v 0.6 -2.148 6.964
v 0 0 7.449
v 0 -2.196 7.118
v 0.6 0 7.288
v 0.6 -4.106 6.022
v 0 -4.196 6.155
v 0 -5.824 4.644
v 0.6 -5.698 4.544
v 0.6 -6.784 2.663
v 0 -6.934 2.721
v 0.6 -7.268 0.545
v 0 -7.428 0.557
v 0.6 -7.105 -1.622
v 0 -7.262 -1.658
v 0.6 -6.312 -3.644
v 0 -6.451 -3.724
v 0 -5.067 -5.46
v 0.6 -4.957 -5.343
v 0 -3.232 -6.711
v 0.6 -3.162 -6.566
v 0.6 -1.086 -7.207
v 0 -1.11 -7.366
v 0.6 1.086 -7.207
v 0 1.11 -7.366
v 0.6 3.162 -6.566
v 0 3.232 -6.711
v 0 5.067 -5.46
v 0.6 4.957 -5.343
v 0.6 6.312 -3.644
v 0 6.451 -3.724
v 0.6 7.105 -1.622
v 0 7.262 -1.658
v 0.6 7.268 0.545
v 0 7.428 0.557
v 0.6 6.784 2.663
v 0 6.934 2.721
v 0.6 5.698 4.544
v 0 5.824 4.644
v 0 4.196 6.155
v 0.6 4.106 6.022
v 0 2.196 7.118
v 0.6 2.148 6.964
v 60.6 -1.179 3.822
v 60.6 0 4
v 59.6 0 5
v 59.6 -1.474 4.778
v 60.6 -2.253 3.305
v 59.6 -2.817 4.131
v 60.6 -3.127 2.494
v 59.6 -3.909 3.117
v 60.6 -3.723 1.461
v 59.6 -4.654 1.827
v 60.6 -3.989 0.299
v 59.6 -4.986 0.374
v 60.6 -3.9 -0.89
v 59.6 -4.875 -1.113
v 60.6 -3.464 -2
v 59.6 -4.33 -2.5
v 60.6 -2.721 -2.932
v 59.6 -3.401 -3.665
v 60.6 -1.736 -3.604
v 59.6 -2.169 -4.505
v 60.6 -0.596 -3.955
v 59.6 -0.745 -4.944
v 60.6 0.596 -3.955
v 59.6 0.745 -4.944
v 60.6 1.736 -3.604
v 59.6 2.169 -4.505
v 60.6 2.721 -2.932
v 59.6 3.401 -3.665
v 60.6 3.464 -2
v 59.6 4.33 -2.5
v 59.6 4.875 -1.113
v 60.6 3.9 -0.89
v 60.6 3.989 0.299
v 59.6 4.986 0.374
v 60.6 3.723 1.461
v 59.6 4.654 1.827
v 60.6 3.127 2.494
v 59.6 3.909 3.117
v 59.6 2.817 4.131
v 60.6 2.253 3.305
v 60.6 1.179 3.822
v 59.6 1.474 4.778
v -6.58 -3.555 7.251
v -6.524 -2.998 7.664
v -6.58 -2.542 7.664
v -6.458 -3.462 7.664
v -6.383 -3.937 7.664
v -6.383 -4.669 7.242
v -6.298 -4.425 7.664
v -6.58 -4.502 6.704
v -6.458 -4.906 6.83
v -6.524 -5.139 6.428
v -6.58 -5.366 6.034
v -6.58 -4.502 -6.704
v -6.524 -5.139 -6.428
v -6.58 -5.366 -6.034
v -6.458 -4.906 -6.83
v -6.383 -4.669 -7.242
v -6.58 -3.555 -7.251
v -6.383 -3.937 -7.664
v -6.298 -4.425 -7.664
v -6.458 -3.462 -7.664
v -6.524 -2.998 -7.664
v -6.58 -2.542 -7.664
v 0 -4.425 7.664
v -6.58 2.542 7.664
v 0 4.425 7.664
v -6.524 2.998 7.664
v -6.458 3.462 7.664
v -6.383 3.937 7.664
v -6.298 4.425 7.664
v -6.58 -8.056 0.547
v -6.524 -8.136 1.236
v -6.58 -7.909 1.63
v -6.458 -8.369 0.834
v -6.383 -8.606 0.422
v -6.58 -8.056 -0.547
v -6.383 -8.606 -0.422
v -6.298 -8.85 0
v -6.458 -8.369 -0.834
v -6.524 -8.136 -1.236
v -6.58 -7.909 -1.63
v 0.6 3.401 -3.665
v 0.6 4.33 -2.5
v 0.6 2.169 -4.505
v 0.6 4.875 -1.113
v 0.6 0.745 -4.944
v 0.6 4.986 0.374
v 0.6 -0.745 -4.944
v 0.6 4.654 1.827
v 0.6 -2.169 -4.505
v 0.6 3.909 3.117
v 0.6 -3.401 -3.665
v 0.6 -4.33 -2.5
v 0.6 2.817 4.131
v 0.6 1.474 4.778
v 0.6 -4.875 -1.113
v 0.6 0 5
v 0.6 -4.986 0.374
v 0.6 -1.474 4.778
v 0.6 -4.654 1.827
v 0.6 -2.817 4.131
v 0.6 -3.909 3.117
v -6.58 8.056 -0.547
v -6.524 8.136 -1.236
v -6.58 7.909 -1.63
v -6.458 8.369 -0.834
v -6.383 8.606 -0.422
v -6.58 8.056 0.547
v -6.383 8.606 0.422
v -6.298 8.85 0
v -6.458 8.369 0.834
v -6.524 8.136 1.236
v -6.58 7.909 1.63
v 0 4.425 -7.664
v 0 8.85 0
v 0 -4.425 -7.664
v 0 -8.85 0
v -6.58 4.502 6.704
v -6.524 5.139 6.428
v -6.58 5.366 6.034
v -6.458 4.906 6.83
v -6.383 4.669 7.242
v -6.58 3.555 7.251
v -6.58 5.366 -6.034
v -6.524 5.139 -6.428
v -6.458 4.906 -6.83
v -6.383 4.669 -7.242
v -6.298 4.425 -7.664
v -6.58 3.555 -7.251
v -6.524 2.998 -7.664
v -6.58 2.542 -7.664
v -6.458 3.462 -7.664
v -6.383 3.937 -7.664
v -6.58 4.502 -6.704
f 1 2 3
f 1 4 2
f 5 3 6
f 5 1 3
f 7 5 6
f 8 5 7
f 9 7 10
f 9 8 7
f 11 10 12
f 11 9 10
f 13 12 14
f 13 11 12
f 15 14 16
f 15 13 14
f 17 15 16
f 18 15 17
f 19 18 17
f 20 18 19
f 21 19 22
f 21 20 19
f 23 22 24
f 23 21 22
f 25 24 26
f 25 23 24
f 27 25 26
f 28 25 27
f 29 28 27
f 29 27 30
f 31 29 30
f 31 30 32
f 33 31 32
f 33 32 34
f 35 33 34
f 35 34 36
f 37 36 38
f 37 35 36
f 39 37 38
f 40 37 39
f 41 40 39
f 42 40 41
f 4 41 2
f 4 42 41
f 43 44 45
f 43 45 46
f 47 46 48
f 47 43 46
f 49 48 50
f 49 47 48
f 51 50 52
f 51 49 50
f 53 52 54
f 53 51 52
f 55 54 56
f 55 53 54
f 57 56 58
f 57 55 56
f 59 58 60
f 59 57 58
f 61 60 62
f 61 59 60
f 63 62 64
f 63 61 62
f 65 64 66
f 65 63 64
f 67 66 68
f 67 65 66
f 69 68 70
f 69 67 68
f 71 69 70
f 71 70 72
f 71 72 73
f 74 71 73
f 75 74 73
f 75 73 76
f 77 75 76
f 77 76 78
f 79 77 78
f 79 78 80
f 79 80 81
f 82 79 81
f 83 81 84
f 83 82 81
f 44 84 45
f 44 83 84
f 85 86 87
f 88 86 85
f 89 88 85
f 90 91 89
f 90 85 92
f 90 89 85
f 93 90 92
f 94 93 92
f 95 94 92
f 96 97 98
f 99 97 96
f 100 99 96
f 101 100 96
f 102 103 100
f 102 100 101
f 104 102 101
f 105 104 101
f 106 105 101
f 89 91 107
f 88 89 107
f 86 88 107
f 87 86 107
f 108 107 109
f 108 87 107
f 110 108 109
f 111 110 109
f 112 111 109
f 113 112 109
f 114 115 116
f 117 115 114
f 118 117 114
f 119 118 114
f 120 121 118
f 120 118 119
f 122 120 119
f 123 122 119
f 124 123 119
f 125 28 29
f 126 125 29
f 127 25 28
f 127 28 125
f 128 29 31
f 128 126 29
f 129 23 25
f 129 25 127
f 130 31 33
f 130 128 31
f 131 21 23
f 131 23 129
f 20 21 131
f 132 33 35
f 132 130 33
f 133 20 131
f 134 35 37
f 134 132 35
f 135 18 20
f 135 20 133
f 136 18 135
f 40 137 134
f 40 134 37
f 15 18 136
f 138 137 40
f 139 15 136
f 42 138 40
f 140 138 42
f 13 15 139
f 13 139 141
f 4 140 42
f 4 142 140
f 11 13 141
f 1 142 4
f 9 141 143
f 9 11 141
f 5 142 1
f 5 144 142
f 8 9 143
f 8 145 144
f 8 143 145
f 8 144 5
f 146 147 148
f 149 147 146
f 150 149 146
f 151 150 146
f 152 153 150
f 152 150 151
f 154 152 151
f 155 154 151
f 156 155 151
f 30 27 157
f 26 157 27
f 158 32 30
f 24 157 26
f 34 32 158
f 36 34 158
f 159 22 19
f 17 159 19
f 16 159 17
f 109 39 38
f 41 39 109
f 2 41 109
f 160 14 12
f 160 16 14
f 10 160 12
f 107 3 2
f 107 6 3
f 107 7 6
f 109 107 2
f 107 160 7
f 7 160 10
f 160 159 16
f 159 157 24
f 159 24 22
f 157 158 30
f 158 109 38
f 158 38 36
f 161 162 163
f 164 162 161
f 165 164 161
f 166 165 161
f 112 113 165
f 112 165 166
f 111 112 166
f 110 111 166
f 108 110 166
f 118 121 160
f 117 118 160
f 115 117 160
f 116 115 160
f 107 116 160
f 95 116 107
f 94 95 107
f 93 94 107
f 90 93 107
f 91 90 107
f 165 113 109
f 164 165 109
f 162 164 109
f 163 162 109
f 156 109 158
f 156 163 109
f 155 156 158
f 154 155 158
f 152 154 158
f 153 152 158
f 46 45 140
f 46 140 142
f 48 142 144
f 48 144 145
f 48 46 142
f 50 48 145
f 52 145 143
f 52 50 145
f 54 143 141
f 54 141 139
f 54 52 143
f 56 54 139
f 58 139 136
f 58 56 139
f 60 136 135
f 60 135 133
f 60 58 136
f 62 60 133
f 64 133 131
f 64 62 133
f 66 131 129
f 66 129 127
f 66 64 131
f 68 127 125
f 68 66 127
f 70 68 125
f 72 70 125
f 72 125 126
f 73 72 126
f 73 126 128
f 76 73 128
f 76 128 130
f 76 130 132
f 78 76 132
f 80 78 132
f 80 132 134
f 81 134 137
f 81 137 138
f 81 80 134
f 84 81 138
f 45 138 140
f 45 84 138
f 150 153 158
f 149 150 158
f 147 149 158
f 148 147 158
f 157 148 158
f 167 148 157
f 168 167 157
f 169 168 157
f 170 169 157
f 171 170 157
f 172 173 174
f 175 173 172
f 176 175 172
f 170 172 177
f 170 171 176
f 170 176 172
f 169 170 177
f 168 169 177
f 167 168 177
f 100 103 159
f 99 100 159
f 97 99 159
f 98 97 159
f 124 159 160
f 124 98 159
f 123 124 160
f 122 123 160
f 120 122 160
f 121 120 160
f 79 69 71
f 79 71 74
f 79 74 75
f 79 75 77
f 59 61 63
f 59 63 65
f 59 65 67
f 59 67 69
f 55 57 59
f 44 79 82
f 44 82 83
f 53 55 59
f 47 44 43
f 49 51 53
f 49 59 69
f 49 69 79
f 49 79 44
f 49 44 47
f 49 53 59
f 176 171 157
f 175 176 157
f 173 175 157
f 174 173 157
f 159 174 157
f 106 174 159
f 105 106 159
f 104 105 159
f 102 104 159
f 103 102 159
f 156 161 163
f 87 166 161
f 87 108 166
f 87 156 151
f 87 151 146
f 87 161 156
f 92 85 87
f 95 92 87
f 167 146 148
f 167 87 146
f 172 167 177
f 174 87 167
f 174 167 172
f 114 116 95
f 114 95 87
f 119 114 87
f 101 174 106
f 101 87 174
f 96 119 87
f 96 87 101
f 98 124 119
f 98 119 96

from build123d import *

# Parameters (mm, degrees)
SKETCH_2_OUTSIDE_W  = 34.038
SKETCH_2_OUTSIDE_H  = 34.038
CUT_EXTRUDE_1_DEPTH = 69.335915886
CHAMFER_1_SIZE      = 1


with BuildPart() as part:
    # Эскиз1 → Повернуть1 (revolve)
    with BuildSketch(Plane.XY, mode=Mode.PRIVATE) as revolve_1_sk:
        Polygon((-6.58, 0), (-6.58, 8.85), (0, 8.85), (0, 7.448974596), (0.6, 7.288205081), (0.6, 5), (60.6, 5), (60.6, 0), align=None)
    revolve(revolve_1_sk.sketch.rotate(Axis((-1000, 0, 0), (1, 0, 0)), 90), axis=Axis((-1000, 0, 0), (1, 0, 0)))

    # Эскиз2 outside → Вырез-Вытянуть1 (cut, through all)
    with BuildSketch(Plane.ZY.offset(6.58)):
        Rectangle(SKETCH_2_OUTSIDE_W, SKETCH_2_OUTSIDE_H)
        Polygon((0, -8.85), (7.664324823, -4.425), (7.664324823, 4.425), (0, 8.85), (-7.664324823, 4.425), (-7.664324823, -4.425), align=None, mode=Mode.SUBTRACT)
    extrude(amount=-CUT_EXTRUDE_1_DEPTH, mode=Mode.SUBTRACT)

    # Эскиз4 → Вырез-Повернуть1 (revolve, cut)
    with BuildSketch(Plane.XY):
        Polygon((-6.58, 8.075), (-6.297923068, 8.85), (-6.58, 8.85), align=None)
    revolve(axis=Axis((-1000, 0, 0), (1, 0, 0)), mode=Mode.SUBTRACT)

    # Фаска1
    chamfer_1_edges = [part.edges().sort_by_distance(p)[0] for p in [
        (60.6, 0, -5),
    ]]
    chamfer(chamfer_1_edges, length=CHAMFER_1_SIZE)


solid = part.part
